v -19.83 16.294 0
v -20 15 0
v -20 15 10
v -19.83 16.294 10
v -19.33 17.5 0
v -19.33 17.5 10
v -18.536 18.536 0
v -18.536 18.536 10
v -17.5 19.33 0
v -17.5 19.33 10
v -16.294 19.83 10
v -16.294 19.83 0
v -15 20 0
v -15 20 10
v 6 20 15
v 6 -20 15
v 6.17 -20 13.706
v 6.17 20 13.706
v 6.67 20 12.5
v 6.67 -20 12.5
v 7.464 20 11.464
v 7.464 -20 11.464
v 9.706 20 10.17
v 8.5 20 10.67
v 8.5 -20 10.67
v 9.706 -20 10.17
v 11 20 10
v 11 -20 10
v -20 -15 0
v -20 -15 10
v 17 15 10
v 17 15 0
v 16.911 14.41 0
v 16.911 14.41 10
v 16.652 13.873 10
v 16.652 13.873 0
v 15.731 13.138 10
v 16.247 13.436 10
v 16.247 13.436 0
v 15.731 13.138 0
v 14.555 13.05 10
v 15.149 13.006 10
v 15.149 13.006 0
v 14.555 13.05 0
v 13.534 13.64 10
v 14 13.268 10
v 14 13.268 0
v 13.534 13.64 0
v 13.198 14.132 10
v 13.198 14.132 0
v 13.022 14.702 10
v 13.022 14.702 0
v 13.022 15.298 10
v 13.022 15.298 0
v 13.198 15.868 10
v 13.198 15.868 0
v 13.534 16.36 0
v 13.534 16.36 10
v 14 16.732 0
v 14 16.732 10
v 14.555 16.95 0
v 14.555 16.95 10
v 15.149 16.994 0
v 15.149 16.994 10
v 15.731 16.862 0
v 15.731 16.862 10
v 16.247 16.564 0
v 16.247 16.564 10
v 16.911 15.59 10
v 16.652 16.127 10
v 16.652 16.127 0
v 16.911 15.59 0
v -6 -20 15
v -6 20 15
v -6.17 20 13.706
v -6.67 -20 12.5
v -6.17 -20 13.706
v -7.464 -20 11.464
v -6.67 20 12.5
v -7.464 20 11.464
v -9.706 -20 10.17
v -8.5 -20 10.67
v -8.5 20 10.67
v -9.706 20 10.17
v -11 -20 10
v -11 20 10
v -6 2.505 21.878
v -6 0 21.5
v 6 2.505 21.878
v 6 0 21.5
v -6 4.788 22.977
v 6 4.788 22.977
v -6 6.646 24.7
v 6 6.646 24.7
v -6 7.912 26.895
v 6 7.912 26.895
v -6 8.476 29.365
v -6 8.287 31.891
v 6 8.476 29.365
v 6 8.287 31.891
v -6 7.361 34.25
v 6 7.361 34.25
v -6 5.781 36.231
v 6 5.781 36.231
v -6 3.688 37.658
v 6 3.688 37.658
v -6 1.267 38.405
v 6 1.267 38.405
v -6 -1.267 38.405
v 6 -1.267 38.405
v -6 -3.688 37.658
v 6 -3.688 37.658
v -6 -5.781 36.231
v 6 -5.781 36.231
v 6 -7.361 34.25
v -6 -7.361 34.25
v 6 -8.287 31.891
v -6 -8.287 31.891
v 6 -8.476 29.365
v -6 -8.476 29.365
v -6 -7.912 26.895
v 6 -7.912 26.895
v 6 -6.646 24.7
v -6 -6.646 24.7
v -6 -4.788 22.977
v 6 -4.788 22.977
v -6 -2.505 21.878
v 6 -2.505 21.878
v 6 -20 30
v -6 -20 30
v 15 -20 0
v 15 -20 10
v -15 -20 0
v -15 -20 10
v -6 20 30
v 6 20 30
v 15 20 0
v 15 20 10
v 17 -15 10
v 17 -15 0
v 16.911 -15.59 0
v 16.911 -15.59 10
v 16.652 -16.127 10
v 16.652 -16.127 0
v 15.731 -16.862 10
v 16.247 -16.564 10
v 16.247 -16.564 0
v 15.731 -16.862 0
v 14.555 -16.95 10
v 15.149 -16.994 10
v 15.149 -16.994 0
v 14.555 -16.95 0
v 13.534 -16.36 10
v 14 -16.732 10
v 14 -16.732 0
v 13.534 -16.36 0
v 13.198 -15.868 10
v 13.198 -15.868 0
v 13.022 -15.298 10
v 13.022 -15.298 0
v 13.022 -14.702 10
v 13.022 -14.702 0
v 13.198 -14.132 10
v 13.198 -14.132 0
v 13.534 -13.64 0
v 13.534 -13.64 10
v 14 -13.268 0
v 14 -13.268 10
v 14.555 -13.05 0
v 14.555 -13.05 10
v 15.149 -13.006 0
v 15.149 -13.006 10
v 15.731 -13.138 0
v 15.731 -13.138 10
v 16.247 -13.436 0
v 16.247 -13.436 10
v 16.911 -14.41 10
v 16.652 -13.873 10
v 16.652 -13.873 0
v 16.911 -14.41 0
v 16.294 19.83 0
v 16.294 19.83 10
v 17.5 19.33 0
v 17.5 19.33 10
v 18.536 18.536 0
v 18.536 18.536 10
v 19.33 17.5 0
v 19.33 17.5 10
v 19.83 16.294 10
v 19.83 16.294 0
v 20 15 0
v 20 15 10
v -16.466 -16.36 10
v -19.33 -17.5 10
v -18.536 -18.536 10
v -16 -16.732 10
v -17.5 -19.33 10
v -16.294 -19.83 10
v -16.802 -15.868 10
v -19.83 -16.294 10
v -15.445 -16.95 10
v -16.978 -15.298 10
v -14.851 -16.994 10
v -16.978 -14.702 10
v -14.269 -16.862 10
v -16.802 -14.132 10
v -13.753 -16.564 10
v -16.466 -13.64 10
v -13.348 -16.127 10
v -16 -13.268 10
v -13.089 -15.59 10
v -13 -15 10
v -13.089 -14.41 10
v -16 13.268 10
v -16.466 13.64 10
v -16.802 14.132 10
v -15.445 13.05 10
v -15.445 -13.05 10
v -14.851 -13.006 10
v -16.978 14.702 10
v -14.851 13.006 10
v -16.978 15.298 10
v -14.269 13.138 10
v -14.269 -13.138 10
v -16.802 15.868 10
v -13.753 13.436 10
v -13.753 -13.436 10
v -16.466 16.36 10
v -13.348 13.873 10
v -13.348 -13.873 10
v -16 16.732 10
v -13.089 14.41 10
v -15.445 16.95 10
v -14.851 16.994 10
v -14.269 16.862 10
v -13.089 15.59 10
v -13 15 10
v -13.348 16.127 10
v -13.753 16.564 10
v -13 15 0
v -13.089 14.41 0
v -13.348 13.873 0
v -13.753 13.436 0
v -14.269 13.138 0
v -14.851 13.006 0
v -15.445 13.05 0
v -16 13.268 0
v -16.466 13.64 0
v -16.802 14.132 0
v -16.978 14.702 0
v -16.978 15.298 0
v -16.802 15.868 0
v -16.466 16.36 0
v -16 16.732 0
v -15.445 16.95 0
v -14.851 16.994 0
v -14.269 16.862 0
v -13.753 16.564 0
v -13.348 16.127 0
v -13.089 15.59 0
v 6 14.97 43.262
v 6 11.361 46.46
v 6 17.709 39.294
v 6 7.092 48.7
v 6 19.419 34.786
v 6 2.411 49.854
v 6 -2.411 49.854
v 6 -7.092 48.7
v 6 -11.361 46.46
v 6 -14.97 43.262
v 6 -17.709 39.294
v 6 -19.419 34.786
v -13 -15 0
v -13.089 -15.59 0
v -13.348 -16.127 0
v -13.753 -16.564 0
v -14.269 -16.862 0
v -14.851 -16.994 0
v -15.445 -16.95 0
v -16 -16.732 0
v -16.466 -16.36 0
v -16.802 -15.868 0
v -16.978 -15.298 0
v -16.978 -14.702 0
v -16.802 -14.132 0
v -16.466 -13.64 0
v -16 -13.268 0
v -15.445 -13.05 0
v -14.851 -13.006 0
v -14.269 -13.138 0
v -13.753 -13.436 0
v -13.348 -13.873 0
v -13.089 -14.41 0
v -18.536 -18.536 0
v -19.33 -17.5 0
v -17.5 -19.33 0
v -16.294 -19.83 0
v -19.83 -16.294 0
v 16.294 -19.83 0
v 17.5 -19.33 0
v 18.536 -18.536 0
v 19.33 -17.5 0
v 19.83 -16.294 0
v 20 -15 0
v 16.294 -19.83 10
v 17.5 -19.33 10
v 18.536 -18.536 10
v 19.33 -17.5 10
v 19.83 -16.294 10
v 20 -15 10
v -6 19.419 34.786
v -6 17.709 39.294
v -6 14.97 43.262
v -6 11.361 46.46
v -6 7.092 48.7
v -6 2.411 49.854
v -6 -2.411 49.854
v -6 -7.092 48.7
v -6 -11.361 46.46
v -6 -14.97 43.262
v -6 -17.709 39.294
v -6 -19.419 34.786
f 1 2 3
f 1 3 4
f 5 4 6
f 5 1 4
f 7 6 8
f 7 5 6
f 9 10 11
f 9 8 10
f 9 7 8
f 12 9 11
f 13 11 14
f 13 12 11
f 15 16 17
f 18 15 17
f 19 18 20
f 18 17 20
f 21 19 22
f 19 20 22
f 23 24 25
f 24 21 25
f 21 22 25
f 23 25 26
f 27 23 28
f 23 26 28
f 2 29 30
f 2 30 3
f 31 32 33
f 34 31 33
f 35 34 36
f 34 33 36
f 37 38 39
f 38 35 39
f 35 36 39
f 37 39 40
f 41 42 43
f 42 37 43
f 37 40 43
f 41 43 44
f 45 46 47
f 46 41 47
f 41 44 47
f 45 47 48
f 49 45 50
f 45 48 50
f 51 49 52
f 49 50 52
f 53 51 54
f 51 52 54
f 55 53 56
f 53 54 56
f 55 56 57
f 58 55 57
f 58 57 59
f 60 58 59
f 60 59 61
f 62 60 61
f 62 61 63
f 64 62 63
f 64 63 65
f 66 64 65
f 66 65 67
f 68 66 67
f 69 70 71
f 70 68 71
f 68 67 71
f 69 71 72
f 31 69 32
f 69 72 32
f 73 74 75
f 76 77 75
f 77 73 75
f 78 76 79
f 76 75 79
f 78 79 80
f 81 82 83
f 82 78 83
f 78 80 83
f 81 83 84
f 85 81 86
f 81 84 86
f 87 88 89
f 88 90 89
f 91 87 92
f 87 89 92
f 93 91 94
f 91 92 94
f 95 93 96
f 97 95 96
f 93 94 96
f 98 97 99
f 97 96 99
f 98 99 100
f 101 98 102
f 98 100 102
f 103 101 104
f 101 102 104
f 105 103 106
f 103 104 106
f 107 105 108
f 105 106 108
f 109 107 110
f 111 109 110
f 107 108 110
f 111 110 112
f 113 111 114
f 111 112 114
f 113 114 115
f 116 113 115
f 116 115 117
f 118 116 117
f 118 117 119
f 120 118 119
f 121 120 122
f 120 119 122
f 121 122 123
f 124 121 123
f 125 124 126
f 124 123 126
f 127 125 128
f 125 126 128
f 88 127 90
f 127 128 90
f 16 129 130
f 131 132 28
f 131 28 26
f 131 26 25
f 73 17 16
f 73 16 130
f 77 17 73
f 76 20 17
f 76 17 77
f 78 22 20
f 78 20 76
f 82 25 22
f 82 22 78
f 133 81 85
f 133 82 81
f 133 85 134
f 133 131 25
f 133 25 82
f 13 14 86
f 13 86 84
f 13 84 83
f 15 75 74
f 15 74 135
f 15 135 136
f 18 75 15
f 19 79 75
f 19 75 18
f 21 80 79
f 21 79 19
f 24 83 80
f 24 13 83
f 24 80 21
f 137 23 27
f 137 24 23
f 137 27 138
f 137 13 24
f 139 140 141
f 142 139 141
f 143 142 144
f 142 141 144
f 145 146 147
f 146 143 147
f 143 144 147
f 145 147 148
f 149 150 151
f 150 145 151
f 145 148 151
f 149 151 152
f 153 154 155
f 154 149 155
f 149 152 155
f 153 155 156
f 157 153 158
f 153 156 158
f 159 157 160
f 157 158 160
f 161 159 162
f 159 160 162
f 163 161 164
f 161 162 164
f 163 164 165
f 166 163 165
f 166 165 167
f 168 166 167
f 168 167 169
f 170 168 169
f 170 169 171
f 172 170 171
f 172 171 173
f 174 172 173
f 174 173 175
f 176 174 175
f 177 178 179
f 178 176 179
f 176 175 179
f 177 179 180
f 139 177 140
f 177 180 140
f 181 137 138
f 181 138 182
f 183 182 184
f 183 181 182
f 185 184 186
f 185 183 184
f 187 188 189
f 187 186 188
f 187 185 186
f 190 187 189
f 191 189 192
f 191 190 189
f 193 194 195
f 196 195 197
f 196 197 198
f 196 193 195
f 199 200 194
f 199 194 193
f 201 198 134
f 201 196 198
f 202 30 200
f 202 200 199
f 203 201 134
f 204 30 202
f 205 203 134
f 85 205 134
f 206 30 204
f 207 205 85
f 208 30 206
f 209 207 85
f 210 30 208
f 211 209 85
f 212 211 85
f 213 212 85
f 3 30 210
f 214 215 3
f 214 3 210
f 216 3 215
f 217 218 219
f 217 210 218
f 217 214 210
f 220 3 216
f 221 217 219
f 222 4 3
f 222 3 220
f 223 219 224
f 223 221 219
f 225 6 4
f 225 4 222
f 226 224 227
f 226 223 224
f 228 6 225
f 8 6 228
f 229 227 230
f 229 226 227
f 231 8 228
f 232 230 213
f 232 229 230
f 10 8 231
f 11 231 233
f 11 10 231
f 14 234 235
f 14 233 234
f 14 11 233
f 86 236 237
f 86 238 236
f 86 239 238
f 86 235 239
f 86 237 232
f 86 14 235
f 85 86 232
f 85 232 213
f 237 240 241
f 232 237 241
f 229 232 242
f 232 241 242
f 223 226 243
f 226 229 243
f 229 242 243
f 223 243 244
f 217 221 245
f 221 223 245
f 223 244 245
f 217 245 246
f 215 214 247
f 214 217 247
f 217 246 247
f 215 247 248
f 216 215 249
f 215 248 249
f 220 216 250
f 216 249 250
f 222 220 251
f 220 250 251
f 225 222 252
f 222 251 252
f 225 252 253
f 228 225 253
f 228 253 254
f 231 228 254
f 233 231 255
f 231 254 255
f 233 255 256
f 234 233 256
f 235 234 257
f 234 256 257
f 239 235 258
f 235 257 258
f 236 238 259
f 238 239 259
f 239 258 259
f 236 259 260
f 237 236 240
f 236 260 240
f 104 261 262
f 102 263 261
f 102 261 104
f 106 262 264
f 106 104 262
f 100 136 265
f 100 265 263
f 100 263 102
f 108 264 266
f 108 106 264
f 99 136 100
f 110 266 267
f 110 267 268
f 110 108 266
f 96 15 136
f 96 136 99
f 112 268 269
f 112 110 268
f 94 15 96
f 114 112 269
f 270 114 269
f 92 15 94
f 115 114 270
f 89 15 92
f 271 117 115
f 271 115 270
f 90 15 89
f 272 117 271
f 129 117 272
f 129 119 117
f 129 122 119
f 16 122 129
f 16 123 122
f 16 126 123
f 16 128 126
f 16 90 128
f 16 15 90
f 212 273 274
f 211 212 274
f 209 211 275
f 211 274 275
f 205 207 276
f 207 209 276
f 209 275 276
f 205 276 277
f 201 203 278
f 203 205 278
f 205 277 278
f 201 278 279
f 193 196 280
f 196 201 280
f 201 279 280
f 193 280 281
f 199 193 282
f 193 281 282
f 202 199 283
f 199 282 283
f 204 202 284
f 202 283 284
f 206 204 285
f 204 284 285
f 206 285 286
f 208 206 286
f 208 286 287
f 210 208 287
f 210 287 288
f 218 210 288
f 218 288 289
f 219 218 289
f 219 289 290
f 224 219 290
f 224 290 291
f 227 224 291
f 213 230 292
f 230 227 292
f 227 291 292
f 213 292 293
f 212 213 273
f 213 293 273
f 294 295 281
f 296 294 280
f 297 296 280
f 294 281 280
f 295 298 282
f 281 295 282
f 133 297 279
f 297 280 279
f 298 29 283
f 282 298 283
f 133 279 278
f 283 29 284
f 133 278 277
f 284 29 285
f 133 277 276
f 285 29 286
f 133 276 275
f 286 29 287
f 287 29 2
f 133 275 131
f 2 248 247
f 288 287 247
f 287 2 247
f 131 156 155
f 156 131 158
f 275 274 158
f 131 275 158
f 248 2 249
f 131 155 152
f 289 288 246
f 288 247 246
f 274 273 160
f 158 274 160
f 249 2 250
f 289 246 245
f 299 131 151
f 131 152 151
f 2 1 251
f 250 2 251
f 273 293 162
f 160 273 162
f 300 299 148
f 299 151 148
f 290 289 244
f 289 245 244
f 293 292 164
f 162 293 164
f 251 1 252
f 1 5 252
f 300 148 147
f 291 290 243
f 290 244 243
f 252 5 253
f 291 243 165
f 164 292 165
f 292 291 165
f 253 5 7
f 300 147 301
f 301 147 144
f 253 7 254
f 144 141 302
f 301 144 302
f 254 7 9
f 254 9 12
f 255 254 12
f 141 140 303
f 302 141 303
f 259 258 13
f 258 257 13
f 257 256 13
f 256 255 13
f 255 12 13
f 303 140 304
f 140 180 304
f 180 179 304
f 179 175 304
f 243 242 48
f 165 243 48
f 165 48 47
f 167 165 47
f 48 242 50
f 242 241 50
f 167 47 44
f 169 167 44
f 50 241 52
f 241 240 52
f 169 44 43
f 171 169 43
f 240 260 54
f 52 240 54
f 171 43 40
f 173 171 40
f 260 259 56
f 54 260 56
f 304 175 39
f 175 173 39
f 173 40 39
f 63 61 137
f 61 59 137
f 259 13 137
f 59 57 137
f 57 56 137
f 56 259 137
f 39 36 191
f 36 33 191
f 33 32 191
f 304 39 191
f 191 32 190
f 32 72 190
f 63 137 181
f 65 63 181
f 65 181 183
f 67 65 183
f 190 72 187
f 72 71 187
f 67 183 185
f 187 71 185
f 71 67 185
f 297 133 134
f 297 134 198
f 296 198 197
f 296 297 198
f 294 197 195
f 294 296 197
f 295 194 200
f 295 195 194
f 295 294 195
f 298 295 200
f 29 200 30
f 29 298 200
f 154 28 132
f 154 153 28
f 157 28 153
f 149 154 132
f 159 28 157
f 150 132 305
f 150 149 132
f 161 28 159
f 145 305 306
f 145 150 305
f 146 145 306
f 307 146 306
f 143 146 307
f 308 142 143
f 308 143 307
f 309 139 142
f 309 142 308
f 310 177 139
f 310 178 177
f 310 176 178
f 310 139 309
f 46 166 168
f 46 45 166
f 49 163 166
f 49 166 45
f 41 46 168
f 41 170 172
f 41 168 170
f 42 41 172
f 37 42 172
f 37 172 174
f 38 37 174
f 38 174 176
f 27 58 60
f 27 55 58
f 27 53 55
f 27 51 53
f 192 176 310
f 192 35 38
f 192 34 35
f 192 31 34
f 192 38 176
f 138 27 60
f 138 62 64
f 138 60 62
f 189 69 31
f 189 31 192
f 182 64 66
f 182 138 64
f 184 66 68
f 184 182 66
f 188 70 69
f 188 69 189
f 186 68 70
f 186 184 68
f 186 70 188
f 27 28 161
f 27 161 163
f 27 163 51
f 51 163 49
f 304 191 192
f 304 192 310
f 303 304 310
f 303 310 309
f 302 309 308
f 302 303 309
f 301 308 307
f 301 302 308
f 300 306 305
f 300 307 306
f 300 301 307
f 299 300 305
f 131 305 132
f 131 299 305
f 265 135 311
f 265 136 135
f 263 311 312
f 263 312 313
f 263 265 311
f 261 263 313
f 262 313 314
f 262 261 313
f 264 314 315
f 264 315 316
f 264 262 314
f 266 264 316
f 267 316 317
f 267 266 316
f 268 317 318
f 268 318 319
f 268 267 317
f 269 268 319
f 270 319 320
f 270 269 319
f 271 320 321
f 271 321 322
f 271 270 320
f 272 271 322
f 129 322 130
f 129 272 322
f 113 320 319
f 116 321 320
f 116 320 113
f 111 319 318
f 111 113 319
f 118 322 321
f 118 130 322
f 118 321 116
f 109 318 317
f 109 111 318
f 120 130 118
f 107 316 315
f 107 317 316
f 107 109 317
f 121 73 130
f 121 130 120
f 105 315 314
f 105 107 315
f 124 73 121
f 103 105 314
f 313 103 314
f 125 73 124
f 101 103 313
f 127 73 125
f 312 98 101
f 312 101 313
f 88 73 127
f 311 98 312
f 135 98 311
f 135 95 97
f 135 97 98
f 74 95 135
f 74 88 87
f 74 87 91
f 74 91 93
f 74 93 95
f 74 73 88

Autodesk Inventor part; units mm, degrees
ref_plane "YZ Plane" through (0, 0, 0) normal (1, 0, 0) x (0, 1, 0)
ref_plane "XZ Plane" through (0, 0, 0) normal (0, 1, 0) x (-1, 0, 0)
ref_plane "XY Plane" through (0, 0, 0) normal (0, 0, 1) x (1, 0, 0)
sketch "Sketch5" plane through (0, 0, 0) normal (0, 0, 1) x (1, 0, 0)
  line L0 (-15, 15) -> (15, 15) construction
  line L1 (15, 15) -> (15, -15) construction
  line L2 (15, -15) -> (-15, -15) construction
  line L3 (-15, -15) -> (-15, 15) construction
  line L4 (-15, 15) -> (15, -15) construction
  line L5 (15, 15) -> (-15, -15) construction
  circle A0 centre (-15, 15) radius 2
  circle A1 centre (15, 15) radius 2
  circle A2 centre (15, -15) radius 2
  circle A3 centre (-15, -15) radius 2
  line L6 (-15, 20) -> (15, 20)
  line L7 (20, 15) -> (20, -15)
  line L8 (15, -20) -> (-15, -20)
  line L9 (-20, -15) -> (-20, 15)
  line L10 (-20, 20) -> (20, -20) construction
  line L11 (20, 20) -> (-20, -20) construction
  arc A4 (20, 15) -> (15, 20) centre (15, 15) ccw
  arc A5 (15, -20) -> (20, -15) centre (15, -15) ccw
  arc A6 (-20, -15) -> (-15, -20) centre (-15, -15) ccw
  arc A7 (-15, 20) -> (-20, 15) centre (-15, 15) ccw
  point P0 (0, 0)
  dimension "d16" = 4
  dimension "d17" = 30
  dimension "d18" = 40
  dimension "d20" = 5
extrude "Extrusion5" add sketch "Sketch5" along normal blind 10
sketch "Sketch6" plane through (0, 0, 10) normal (0, 0, 1) x (1, 0, 0)
  line L0 (-15, -20) -> (15, -20) projected
  line L1 (-6, 20) -> (6, 20)
  line L2 (6, 20) -> (6, -20)
  line L3 (6, -20) -> (-6, -20)
  line L4 (-6, -20) -> (-6, 20)
  line L5 (-6, 20) -> (6, -20) construction
  line L6 (6, 20) -> (-6, -20) construction
  point P0 (0, 0)
  dimension "d23" = 12
extrude "Extrusion6" add sketch "Sketch6" along normal blind 40
fillet "Fillet2" radius 5 2 edges at (6, 0, 10) (-6, 0, 10)
sketch "Sketch7" plane through (6, -20, 50) normal (1, 0, 0) x (0, 0, -1)
  circle A0 centre (20, 20) radius 8.5
  circle A1 centre (20, 20) radius 20
  line L0 (0, 0) -> (0, 40) projected
  line L1 (40, 0) -> (40, 40) projected
  line L2 (35, 0) -> (0, 0) projected
  line L3 (20, 0) -> (0, 0)
  line L4 (0, 0) -> (0, 40)
  line L5 (0, 40) -> (20, 40)
  line L6 (35, 40) -> (0, 40) projected
  point P0 (50, 20)
  point P1 (0, 20)
  dimension "d27" = 17
extrude "Extrusion7" cut sketch "Sketch7" against normal blind 50 contours A0 | A1 L0 L5 | L2 L0 A1
sketch "Sketch1" plane through (0, 0, 0) normal (0, 1, 0) x (-1, 0, 0)
  line L0 (27.5, 22.5) -> (-27.5, 22.5)
  line L1 (-27.5, 22.5) -> (-27.5, -22.5)
  line L2 (-27.5, -22.5) -> (27.5, -22.5)
  line L3 (27.5, -22.5) -> (27.5, 22.5)
  point P0 (0, 0)
  point P1 (27.5, 0)
  point P2 (0, -22.5)
  dimension "d0" = 45
  dimension "d1" = 55
sketch "Sketch2" plane through (0, 10, 0) normal (0, 1, 0) x (1, 0, 0)
  line L0 (-27.5, 22.5) -> (-27.5, -22.5) projected
  line L1 (-27.5, -22.5) -> (27.5, -22.5) projected
  line L2 (-27.5, 22.5) -> (-19.5, 22.5)
  line L3 (-19.5, 22.5) -> (-19.5, -22.5)
  line L4 (-19.5, -22.5) -> (-27.5, -22.5)
  line L5 (-27.5, -22.5) -> (-27.5, 22.5)
  line L6 (27.5, -22.5) -> (27.5, 22.5) projected
  line L7 (27.5, 22.5) -> (19.5, 22.5)
  line L8 (19.5, 22.5) -> (19.5, -22.5)
  line L9 (19.5, -22.5) -> (27.5, -22.5)
  line L10 (27.5, -22.5) -> (27.5, 22.5)
  point P0 (0, 0)
  dimension "d4" = 8
  dimension "d5" = 8
sketch "Sketch4" plane through (0, 0, 0) normal (0, -1, 0) x (1, 0, 0)
  line L0 (15, 15) -> (-15, 15) construction
  line L1 (-15, 15) -> (-15, -15) construction
  line L2 (-15, -15) -> (15, -15) construction
  line L3 (15, -15) -> (15, 15) construction
  line L4 (15, 15) -> (-15, -15) construction
  line L5 (-15, 15) -> (15, -15) construction
  circle A0 centre (15, -15) radius 2
  circle A1 centre (-15, -15) radius 2
  circle A2 centre (-15, 15) radius 2
  circle A3 centre (15, 15) radius 2
  point P0 (0, 0)
  dimension "d12" = 30
  dimension "d13" = 4
sketch "Sketch3" plane through (27.5, 0, 22.5) normal (1, 0, 0) x (0, 0, -1)
  circle A0 centre (22.5, 25) radius 15
  line L0 (22.5, 25) -> (22.5, 47.5) construction
  line L1 (45, 47.5) -> (0, 47.5) projected
  line L2 (22.5, 25) -> (45, 25) construction
  line L3 (45, 0) -> (45, 47.5) projected
  point P0 (22.5, 0)
  dimension "d9" = 30
properties part number "DoubleHinger"
